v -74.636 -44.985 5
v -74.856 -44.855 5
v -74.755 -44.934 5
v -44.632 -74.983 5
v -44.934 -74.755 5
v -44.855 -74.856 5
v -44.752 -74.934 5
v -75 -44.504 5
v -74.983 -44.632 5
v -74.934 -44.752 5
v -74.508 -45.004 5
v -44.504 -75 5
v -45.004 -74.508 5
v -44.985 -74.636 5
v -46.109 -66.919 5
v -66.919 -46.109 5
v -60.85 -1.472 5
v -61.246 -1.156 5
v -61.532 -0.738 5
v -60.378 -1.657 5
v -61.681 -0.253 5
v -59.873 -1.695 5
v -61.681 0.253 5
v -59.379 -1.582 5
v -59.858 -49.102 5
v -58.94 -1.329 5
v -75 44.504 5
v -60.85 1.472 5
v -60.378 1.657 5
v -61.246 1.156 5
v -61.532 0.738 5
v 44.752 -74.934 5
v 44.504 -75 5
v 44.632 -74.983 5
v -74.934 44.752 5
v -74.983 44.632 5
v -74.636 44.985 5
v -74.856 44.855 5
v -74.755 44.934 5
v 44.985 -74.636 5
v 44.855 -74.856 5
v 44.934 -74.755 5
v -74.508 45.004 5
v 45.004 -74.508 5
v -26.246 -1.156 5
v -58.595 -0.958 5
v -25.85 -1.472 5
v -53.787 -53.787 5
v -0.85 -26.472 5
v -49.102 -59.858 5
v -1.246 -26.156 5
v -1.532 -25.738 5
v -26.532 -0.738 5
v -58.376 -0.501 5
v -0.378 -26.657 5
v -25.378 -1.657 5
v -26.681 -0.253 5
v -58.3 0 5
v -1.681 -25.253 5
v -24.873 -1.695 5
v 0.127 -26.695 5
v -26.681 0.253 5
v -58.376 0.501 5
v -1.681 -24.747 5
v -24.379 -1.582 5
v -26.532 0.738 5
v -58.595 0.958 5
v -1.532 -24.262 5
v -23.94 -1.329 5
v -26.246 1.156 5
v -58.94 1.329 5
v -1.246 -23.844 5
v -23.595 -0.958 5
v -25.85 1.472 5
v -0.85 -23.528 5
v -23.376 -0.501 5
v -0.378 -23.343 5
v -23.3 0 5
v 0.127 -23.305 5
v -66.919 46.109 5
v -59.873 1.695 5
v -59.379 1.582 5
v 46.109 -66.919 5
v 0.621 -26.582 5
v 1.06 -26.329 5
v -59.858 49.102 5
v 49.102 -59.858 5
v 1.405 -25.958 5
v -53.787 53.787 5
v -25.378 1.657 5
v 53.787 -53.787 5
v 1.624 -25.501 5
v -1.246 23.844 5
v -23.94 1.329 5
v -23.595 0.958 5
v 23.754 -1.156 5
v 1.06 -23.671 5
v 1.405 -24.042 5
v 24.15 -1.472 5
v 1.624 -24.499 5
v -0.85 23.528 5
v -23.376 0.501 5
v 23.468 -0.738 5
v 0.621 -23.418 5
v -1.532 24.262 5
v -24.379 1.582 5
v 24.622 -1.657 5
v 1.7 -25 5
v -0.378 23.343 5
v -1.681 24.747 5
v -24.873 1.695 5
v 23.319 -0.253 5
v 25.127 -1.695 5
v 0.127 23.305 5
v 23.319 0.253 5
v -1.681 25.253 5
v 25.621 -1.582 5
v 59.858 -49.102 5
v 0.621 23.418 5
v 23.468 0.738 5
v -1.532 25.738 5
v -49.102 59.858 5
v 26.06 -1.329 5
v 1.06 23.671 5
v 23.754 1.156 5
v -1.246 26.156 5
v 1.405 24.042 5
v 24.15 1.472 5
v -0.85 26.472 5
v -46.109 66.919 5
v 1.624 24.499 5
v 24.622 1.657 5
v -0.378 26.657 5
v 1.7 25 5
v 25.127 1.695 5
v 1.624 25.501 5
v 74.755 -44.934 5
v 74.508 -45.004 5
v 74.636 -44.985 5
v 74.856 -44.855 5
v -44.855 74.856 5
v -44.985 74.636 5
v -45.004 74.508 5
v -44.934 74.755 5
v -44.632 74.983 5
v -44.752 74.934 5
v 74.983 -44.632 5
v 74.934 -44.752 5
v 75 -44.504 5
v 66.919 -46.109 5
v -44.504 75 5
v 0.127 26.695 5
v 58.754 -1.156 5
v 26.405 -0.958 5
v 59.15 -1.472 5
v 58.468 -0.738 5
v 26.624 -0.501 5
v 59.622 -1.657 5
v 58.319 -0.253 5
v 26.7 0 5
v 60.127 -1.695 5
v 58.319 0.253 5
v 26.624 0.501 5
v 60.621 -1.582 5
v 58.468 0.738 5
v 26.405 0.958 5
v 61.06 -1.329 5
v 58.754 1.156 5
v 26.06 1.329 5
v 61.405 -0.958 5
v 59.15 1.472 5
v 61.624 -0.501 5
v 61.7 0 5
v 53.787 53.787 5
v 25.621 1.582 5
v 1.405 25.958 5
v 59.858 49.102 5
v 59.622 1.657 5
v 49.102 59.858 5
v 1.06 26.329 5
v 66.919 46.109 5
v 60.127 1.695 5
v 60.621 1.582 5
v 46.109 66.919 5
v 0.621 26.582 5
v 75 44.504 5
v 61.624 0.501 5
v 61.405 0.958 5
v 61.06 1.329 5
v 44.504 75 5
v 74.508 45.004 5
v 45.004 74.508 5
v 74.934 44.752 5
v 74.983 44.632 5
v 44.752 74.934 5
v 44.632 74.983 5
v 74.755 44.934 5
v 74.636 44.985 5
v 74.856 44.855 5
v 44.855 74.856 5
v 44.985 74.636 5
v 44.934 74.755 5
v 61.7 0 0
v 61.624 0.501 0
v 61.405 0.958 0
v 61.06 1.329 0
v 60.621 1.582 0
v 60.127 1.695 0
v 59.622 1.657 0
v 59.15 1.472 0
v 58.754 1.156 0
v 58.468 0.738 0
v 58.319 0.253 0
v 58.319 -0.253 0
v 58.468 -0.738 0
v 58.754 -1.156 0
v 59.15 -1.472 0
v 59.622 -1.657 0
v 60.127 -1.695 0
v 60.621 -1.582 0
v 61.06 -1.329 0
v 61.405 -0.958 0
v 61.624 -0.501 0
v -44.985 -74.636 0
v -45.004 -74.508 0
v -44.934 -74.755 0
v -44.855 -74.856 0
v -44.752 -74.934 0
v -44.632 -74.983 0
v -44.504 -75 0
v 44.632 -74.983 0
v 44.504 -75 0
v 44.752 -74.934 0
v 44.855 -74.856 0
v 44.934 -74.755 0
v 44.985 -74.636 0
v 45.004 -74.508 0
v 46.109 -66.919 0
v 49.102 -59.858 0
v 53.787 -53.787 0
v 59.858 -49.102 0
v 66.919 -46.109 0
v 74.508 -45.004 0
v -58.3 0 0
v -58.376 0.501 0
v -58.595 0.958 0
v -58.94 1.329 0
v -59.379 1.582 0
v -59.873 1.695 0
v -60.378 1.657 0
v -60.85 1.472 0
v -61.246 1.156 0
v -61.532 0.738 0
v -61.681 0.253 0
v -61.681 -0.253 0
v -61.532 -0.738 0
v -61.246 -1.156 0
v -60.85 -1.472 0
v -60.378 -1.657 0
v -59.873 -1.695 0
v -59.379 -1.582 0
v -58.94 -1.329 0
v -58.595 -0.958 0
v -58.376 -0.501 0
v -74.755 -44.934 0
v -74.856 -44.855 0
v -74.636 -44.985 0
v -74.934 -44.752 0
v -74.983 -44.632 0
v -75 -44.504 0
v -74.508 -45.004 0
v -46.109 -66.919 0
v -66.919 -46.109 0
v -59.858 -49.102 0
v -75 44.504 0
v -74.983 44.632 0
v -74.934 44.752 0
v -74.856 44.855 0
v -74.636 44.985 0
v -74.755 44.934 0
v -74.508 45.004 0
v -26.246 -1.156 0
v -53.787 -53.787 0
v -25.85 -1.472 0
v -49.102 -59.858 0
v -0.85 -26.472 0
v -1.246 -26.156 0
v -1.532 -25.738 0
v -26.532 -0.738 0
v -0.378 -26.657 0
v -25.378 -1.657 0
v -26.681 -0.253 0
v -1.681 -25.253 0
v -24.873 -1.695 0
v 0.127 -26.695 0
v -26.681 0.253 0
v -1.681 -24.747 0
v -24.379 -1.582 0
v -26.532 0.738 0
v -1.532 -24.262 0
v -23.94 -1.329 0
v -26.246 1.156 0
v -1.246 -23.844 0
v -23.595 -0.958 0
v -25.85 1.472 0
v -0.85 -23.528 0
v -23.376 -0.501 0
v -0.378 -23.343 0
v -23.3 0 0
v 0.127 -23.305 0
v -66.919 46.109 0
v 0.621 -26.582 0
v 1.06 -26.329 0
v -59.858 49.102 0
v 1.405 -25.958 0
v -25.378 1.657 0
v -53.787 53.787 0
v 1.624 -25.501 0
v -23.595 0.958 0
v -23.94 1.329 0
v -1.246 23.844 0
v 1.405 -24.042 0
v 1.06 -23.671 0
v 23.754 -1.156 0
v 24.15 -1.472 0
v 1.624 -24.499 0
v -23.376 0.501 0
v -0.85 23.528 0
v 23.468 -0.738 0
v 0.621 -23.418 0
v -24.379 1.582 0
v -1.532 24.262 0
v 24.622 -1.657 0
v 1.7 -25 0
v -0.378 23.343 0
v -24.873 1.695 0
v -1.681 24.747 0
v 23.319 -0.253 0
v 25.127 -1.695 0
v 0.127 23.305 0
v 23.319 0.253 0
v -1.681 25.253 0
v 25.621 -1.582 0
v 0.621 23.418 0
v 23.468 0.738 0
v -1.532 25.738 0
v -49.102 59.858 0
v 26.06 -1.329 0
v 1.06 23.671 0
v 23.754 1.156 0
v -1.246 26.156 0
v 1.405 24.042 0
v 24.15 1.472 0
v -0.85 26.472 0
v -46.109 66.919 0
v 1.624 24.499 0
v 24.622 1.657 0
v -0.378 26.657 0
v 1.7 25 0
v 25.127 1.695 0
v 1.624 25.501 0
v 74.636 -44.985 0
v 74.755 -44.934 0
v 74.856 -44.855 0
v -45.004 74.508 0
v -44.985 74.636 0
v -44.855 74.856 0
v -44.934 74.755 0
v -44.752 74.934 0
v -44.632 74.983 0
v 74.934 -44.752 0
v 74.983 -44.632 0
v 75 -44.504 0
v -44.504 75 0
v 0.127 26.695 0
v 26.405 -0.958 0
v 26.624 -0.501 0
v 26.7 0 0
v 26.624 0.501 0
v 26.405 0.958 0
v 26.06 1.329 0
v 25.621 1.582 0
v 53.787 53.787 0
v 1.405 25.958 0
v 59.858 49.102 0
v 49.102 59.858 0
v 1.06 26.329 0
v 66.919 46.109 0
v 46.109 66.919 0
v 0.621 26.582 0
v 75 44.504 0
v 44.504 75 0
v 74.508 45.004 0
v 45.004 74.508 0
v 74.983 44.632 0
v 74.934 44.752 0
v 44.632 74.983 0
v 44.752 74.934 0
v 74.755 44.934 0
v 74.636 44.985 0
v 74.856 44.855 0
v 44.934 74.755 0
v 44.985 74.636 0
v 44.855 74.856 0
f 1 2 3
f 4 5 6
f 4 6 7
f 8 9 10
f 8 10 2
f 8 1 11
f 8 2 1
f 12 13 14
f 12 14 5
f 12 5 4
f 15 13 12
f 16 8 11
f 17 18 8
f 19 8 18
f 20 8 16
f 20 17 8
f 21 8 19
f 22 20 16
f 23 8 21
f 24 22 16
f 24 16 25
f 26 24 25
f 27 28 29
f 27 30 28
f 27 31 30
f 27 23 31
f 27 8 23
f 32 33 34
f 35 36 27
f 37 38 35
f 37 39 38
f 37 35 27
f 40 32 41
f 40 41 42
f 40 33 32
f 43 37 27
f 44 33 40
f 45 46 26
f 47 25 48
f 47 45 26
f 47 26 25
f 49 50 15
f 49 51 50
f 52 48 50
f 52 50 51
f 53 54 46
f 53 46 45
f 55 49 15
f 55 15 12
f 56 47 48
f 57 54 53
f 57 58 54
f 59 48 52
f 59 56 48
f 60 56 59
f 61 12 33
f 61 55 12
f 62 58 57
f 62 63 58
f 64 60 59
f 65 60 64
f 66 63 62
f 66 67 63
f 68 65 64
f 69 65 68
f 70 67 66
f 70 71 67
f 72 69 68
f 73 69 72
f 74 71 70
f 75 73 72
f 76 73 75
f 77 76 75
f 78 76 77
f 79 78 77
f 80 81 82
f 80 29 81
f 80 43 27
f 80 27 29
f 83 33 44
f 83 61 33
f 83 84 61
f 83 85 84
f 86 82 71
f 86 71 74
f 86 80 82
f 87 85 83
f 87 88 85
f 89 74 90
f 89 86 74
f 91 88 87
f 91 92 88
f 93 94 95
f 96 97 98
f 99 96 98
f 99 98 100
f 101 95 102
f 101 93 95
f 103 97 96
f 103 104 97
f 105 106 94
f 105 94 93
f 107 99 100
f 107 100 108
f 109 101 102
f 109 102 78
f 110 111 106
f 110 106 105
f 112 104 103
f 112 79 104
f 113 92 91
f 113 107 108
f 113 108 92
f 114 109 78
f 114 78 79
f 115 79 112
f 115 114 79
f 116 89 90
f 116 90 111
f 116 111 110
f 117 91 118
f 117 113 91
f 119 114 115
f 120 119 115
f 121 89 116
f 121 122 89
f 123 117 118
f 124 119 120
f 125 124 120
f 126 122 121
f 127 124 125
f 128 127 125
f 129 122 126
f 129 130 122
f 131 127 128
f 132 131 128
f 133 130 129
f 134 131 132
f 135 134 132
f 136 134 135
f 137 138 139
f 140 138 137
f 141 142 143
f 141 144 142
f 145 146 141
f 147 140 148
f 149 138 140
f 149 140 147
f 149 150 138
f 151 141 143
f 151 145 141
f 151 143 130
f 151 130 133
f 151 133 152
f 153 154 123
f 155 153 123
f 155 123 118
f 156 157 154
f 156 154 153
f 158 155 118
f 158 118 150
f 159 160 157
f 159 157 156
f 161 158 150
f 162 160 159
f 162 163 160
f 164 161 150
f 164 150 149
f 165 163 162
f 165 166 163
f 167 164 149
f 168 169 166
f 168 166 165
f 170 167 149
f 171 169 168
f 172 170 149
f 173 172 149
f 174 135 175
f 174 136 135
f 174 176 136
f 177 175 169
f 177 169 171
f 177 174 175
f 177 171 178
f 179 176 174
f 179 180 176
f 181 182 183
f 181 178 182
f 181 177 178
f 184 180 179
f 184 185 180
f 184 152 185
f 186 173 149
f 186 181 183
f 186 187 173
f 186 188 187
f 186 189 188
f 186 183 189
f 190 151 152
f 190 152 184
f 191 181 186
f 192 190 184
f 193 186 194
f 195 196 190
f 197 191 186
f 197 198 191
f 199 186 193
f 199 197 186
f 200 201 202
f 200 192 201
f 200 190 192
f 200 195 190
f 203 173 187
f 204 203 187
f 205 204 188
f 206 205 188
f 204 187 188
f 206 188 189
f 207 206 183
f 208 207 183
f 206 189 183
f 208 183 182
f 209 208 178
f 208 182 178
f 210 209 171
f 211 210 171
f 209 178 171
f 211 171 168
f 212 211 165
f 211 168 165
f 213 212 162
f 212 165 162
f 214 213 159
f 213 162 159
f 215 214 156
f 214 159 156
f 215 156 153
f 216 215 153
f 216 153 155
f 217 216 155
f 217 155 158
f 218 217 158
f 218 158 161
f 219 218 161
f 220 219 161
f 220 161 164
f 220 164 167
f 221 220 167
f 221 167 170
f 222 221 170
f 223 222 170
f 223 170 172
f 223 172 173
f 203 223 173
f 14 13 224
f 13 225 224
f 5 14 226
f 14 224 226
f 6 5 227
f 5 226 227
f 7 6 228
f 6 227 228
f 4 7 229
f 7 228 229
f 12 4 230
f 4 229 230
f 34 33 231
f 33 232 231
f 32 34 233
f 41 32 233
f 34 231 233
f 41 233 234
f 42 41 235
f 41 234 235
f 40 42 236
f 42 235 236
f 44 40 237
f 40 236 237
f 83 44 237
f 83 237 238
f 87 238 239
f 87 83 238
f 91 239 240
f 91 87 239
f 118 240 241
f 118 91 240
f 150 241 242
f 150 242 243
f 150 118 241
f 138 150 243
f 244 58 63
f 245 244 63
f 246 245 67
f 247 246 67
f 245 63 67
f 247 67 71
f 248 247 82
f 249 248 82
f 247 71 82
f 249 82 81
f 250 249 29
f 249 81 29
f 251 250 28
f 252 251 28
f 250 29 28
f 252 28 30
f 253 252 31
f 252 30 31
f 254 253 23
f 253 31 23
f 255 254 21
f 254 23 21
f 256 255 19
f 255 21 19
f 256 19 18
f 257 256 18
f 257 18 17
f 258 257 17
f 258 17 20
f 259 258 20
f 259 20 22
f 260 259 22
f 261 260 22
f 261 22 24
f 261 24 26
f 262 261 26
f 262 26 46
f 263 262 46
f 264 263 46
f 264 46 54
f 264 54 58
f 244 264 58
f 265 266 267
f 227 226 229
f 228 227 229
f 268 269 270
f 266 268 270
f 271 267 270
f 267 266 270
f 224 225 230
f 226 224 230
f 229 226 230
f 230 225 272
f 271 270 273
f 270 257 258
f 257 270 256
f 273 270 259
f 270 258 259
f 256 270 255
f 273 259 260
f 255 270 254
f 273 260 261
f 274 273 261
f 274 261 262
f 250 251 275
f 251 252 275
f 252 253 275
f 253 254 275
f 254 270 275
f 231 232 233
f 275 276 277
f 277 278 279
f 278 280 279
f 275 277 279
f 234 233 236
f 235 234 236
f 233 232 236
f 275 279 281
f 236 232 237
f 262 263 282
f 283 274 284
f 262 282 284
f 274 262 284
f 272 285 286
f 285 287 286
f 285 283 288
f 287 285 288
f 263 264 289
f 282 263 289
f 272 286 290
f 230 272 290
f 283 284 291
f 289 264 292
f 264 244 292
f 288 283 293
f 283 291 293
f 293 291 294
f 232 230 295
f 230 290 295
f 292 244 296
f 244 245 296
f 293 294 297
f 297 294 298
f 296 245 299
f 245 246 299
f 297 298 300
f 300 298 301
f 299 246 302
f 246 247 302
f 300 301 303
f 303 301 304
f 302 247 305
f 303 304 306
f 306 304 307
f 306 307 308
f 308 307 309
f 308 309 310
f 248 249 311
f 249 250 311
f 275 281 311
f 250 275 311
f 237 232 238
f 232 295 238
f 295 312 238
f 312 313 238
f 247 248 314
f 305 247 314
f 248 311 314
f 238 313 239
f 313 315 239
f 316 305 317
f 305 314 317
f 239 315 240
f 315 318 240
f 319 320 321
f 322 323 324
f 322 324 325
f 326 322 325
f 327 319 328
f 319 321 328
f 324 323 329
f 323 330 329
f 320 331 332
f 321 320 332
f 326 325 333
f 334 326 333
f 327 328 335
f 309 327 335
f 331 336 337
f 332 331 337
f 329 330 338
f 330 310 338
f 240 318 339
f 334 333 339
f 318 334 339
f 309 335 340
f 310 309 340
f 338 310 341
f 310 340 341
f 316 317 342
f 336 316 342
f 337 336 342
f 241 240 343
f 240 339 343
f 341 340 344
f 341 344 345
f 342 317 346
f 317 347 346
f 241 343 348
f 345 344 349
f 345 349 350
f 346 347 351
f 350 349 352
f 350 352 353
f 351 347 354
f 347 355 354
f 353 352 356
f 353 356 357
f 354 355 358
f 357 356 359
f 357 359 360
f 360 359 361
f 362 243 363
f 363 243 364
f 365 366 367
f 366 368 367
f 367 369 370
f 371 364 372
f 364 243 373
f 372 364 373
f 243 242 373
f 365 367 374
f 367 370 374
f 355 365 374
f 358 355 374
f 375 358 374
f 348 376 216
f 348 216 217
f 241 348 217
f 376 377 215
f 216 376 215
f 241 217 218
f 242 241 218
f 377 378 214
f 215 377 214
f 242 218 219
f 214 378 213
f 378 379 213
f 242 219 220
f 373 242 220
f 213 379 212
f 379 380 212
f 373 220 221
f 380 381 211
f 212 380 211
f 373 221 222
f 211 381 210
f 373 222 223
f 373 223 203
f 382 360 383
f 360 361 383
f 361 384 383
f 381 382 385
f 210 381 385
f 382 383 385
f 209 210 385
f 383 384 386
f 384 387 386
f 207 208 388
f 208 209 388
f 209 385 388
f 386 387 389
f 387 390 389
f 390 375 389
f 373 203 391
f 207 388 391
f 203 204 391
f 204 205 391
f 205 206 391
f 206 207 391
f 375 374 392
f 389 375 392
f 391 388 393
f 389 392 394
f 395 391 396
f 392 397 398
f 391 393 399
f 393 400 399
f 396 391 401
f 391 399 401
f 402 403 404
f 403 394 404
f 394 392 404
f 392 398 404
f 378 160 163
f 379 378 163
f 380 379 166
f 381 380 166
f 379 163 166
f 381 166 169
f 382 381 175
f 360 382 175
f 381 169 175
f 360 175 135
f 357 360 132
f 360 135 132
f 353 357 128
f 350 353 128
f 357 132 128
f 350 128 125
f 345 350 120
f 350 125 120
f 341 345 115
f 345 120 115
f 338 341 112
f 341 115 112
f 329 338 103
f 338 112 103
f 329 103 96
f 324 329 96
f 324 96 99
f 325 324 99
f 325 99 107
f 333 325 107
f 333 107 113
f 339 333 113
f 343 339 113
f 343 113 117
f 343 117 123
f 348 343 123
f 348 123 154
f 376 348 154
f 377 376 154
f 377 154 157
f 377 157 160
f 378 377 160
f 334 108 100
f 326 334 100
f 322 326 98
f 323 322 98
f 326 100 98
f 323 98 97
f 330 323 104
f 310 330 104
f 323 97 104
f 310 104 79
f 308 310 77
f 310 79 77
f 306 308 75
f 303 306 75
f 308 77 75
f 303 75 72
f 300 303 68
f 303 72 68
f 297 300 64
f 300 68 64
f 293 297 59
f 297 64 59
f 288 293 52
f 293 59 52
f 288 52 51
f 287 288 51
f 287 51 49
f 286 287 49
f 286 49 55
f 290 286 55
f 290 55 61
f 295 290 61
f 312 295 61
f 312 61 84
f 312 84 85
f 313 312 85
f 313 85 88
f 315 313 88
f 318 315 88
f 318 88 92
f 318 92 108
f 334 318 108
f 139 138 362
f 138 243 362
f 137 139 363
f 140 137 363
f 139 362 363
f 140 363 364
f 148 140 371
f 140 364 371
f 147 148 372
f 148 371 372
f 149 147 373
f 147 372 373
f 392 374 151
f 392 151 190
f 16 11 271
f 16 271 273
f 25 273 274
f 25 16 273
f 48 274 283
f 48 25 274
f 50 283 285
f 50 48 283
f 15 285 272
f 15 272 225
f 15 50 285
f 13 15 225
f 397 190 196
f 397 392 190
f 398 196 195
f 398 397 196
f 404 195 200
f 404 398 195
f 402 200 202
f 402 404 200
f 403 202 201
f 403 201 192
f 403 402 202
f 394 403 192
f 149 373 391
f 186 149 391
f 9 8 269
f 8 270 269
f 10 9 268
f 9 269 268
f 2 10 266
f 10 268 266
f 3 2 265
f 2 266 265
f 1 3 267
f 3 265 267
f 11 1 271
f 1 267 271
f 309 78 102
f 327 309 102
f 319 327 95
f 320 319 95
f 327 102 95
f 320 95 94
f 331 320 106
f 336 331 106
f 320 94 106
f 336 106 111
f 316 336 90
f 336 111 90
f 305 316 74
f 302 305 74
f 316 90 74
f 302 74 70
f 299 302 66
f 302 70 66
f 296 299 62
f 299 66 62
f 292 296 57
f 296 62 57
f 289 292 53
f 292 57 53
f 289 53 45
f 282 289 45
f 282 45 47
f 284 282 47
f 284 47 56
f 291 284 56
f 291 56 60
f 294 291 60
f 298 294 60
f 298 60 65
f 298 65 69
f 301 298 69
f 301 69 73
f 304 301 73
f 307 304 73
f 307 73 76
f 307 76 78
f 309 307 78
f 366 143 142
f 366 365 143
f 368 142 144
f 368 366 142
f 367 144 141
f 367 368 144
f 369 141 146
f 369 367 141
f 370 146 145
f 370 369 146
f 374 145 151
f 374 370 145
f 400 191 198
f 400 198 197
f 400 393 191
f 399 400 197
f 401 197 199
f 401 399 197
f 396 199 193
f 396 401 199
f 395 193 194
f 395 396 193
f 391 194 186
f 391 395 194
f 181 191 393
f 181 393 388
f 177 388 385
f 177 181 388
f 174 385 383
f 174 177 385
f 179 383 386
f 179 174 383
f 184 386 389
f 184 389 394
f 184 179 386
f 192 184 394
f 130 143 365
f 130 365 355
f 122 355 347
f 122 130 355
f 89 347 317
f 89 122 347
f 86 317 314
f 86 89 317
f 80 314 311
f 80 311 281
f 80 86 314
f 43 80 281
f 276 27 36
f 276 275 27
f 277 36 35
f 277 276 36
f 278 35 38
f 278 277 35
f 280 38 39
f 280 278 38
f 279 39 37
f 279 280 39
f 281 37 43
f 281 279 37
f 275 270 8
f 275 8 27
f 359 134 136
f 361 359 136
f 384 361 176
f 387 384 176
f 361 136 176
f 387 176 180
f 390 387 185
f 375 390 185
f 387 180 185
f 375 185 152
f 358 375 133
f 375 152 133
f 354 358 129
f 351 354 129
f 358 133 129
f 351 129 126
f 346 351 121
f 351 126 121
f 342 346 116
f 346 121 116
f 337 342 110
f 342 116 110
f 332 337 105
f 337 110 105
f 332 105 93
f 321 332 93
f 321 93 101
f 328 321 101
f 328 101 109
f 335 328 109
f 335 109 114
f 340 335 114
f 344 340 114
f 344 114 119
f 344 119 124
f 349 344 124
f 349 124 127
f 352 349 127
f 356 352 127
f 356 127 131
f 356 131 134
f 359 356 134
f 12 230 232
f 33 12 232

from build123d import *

# Parameters (mm, degrees)
ESQUISSE1_W             = 150
ESQUISSE1_H             = 150
BOSS_EXTRU_1_DEPTH      = 5
ENL_V_MAT_EXTRU_1_DEPTH = 5
D_GAGEMENT_M31_D        = 3.4
CONG_1_R                = 0.5


with BuildPart() as part:
    # Esquisse1 → Boss.-Extru.1 (new body)
    with BuildSketch(Plane.XY):
        Rectangle(ESQUISSE1_W, ESQUISSE1_H)
    extrude(amount=BOSS_EXTRU_1_DEPTH)

    # Esquisse2 → Enlèv. mat.-Extru.1 (cut)
    with BuildSketch(Plane.XY.offset(5)):
        with BuildLine():
            Line((45, 75), (75, 75))
            Line((75, 75), (75, 45))
            ThreePointArc((75, 45), (53.786796564, 53.786796564), (45, 75))
        make_face()
        with BuildLine():
            Line((75, -75), (45, -75))
            ThreePointArc((45, -75), (53.786796564, -53.786796564), (75, -45))
            Line((75, -45), (75, -75))
        make_face()
        with BuildLine():
            Line((-75, -75), (-75, -45))
            ThreePointArc((-75, -45), (-53.786796564, -53.786796564), (-45, -75))
            Line((-45, -75), (-75, -75))
        make_face()
        with BuildLine():
            Line((-75, 75), (-45, 75))
            ThreePointArc((-45, 75), (-53.786796564, 53.786796564), (-75, 45))
            Line((-75, 45), (-75, 75))
        make_face()
    extrude(amount=-ENL_V_MAT_EXTRU_1_DEPTH, mode=Mode.SUBTRACT)

    # Dégagement M31 (through all)
    with Locations(Plane(origin=(0, 0, 0), x_dir=(-1, 0, 0), z_dir=(0, 0, -1))):
        with Locations((0, 25), (0, -25), (60, 0), (25, 0), (-25, 0), (-60, 0)):
            Hole(D_GAGEMENT_M31_D / 2)

    # Congé1
    cong_1_edges = [part.edges().sort_by_distance(p)[0] for p in [
        (-75, 45, 2.5),
        (-45, 75, 2.5),
        (-45, -75, 2.5),
        (-75, -45, 2.5),
        (75, -45, 2.5),
        (45, -75, 2.5),
        (75, 45, 2.5),
        (45, 75, 2.5),
    ]]
    fillet(cong_1_edges, radius=CONG_1_R)


solid = part.part
